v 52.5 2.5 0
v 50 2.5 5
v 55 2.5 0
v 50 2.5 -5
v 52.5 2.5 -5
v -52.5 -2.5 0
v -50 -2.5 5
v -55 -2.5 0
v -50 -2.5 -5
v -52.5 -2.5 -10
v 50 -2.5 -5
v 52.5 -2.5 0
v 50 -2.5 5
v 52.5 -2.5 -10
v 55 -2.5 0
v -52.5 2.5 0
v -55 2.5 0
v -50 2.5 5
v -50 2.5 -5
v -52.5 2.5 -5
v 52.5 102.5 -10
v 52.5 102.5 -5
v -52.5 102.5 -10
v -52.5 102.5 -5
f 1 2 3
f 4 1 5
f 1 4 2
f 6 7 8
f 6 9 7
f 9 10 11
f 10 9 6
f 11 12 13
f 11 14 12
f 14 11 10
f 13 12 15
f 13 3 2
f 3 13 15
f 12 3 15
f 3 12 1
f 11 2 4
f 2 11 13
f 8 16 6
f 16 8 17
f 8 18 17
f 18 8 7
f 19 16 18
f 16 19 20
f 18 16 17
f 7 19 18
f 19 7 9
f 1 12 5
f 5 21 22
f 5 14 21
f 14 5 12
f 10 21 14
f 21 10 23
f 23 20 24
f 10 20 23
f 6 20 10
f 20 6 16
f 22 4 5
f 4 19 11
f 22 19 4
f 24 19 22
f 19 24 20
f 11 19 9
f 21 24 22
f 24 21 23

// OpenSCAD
include <MCAD/triangles.scad>;

//U_clip_top( [5,5,5], 100, 10, 10, true );

U_clip_top( [5,5,5], 100, 10, 100, false );

//_clip( [5,5,5], false );

//_pin( 20, 40, 10 );

module U_clip_top(pins_size, pin_dist, clip_length, clip_ht, with_mounting_holes = false)
{
    thk = pins_size.y;
    clip_x_thk = pins_size.x/2;
    
    _clip( pins_size, pin_dist, with_mounting_holes );
    
    translate([pin_dist/2,-thk/2,-clip_length]) cube([clip_x_thk, thk, clip_length]);
    translate([-pin_dist/2-clip_x_thk,-thk/2,-clip_length]) cube([clip_x_thk, thk, clip_length]);
    
    translate([-pin_dist/2-clip_x_thk,-thk/2,-clip_length]) cube([clip_x_thk*2+pin_dist, thk, thk]);
    
    translate([-pin_dist/2-clip_x_thk,-thk/2,-clip_length]) cube([clip_x_thk*2+pin_dist, thk+clip_ht, thk]);
    
    
}

module _clip( pins_size, pin_dist, with_mounting_holes = false)
{
    
    translate([pin_dist/2, 0, 0]) _pin( pins_size.x, pins_size.z, pins_size.y, with_mounting_holes );
    
    translate([-pin_dist/2, 0, 0]) rotate([0,0,180]) _pin( pins_size.x, pins_size.z, pins_size.y, with_mounting_holes );
}

module _pin( pin_base, pin_ht, thk, with_mounting_holes = false )
{
    hole_bottom_size = 5;
    if( with_mounting_holes == true )
    {
        translate([-pin_base/2,-thk/2, -hole_bottom_size]) cube([pin_base, thk, pin_ht + hole_bottom_size ]);
    }
    else
    {
        translate([0,thk/2,0]) rotate([90,0,0]) triangle(pin_ht, pin_base,thk);
    }
}
